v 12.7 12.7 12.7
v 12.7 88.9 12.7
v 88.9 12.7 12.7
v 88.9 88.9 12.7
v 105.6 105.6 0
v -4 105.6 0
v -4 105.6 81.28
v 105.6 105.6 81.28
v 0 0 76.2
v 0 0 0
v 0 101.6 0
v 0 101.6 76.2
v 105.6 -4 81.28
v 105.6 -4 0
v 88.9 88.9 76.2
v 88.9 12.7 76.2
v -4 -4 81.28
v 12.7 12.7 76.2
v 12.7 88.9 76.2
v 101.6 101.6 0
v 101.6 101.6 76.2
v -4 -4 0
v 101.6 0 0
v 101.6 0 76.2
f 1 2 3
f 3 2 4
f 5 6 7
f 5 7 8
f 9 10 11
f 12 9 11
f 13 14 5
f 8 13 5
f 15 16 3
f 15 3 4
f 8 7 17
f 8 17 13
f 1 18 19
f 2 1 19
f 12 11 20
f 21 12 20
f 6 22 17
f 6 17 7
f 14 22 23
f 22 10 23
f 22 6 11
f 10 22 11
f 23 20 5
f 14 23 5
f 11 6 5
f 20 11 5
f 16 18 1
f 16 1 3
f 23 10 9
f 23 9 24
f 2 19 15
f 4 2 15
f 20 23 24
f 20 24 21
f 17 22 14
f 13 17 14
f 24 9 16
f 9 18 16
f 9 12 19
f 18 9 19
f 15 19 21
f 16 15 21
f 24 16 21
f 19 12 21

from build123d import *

# Parameters (mm, degrees)
F0_W     = 101.6
F0_H     = 101.6
F1_DEPTH = 76.2
F2_W     = 76.2
F2_H     = 76.2
F3_DEPTH = 63.5
F4_W     = 109.6
F4_H     = 109.6
F5_DEPTH = 81.28


with BuildPart() as f1:
    # F0 (on Top) → F1 (new body)
    with BuildSketch(Plane.XY):
        with Locations((50.8, 50.8)):
            Rectangle(F0_W, F0_H)
    extrude(amount=F1_DEPTH)

    # F2 (on face) → F3 (cut)
    with BuildSketch(Plane.XY.offset(76.2)):
        with Locations((50.8, 50.8)):
            Rectangle(F2_W, F2_H)
    extrude(amount=-F3_DEPTH, mode=Mode.SUBTRACT)


with BuildPart() as f5:
    # F4 (on Top) → F5 (new body)
    with BuildSketch(Plane.XY):
        with Locations((50.8, 50.8)):
            Rectangle(F4_W, F4_H)
    extrude(amount=F5_DEPTH)

    # F6: cut F1
    add(f1.part, mode=Mode.SUBTRACT)


solid = f5.part
